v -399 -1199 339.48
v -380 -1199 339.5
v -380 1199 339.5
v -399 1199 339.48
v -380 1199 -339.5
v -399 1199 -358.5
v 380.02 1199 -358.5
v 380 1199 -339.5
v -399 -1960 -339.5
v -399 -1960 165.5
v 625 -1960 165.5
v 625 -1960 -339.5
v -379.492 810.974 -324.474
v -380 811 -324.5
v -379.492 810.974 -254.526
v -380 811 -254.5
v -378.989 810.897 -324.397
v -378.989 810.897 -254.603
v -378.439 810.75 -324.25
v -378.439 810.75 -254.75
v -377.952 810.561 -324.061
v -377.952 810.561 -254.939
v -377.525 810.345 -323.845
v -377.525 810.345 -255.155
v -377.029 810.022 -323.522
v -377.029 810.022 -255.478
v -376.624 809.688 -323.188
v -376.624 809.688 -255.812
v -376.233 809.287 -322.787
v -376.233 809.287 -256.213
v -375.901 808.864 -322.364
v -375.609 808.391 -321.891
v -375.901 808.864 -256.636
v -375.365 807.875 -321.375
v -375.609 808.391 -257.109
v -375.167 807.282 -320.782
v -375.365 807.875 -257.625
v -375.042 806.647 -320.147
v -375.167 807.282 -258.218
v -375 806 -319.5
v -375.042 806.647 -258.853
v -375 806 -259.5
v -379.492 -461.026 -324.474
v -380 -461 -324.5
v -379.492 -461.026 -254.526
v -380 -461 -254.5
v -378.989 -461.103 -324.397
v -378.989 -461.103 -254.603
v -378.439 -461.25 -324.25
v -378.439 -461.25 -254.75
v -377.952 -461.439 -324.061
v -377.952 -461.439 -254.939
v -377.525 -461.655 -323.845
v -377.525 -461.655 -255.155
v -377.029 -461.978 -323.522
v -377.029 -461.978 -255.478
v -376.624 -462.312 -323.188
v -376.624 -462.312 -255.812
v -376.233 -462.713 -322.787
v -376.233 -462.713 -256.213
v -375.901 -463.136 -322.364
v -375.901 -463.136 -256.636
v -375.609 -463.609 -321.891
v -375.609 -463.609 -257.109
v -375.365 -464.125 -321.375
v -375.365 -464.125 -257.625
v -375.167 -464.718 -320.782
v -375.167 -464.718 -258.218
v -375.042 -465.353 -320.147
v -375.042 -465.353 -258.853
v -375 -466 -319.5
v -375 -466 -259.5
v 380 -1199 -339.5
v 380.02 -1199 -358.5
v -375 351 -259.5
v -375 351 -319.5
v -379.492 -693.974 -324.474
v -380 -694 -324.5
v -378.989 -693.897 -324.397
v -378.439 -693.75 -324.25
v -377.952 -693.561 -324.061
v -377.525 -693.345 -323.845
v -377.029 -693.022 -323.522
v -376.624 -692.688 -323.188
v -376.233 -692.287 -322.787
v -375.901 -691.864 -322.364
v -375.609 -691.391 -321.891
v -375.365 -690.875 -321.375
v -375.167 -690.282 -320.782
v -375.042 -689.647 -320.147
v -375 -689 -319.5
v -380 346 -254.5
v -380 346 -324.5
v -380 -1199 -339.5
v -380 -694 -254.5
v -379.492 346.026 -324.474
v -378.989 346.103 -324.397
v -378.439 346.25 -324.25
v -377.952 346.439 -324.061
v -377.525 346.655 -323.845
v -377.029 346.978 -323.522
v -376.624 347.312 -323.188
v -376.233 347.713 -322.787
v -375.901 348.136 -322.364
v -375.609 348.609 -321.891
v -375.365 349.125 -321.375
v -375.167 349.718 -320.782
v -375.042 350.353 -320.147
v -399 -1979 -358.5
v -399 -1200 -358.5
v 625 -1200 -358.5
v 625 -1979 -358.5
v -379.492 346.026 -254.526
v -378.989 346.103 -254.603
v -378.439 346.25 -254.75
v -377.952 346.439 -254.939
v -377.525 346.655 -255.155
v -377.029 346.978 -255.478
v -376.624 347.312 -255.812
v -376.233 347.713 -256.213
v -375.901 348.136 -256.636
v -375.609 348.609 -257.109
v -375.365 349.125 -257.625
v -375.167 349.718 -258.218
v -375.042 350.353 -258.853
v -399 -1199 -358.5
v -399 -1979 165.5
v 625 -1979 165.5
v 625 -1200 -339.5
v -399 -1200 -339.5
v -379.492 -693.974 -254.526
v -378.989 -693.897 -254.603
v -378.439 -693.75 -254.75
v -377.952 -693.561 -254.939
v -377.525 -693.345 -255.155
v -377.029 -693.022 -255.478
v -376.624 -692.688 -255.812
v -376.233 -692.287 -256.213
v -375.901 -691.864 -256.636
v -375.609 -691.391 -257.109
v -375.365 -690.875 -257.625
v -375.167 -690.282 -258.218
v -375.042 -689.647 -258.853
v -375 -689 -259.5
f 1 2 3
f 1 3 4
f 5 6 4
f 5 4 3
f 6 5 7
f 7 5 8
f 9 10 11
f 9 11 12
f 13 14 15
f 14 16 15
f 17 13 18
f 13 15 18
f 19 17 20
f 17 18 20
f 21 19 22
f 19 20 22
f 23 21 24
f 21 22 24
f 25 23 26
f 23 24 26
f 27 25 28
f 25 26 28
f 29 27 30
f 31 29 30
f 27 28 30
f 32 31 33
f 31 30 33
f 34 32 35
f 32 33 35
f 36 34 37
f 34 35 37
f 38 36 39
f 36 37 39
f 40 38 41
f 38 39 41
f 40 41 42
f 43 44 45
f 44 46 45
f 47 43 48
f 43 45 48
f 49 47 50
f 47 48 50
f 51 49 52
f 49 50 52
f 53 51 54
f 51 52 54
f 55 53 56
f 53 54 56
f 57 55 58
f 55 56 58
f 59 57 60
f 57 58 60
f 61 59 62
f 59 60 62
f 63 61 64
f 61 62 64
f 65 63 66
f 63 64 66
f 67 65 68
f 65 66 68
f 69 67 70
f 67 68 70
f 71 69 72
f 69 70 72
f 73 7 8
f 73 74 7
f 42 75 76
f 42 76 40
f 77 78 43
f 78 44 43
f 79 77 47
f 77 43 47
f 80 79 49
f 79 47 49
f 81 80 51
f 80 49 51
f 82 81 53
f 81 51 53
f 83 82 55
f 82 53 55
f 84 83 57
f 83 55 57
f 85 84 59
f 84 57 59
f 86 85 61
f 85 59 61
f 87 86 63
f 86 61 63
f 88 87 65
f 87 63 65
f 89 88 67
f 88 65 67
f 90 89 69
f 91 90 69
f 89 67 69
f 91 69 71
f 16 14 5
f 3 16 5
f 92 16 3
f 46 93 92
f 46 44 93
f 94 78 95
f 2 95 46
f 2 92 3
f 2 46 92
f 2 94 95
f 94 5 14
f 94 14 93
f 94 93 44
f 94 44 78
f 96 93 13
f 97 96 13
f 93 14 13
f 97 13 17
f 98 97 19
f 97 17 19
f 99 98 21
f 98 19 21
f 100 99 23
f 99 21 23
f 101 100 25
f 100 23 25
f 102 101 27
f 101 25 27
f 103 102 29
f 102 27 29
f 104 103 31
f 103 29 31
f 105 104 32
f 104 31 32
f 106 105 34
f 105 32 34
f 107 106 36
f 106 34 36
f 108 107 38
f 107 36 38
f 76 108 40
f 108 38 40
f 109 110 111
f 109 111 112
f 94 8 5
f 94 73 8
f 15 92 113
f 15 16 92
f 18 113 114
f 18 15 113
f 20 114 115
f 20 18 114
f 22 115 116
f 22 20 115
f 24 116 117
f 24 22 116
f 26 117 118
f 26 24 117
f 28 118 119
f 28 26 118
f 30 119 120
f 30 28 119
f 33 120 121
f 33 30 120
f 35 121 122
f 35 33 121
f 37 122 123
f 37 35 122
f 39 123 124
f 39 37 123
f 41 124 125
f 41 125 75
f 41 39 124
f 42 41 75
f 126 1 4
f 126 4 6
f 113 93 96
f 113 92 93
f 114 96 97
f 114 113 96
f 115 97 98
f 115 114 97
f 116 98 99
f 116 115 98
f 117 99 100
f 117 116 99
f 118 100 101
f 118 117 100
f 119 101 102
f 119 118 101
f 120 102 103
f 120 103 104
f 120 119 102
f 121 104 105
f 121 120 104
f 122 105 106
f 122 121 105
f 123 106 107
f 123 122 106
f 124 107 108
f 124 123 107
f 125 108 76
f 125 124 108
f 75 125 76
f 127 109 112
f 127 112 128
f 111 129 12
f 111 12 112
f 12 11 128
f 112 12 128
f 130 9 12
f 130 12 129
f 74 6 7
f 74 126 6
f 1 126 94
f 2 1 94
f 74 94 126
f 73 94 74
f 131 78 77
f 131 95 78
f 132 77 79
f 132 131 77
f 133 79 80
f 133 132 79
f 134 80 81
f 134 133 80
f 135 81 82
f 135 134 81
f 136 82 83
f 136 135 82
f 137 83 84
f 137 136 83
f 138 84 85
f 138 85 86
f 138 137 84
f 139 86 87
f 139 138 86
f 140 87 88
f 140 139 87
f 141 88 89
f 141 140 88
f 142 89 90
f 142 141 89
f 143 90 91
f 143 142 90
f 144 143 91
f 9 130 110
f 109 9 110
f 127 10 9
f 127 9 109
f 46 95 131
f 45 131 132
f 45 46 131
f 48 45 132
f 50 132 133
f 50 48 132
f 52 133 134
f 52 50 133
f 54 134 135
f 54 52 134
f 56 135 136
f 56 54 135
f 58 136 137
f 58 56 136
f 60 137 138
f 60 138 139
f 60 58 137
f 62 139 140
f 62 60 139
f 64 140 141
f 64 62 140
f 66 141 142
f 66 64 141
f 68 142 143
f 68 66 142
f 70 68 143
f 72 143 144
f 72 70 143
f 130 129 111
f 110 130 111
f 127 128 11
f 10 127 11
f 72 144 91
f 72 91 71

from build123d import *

# Parameters (mm, degrees)
F1_DEPTH = 1199
F2_W     = 233
F2_H     = 70
F2_W_2   = 465
F3_DEPTH = 5
F4_R     = 4.99999
F6_DEPTH = 1024


# Not quite as in the source:
# - a fillet or chamfer is up to 0.001 mm smaller than in the source, because OpenCascade refuses the exact size


with BuildPart() as f1:
    # F0 (on Front) → F1 (new body, symmetric)
    with BuildSketch(Plane.XZ):
        Polygon((380, -339.5), (-380, -339.5), (-380, 339.5), (-398.9999890327, 339.4795854083), (-398.9999890327, -358.4999890327), (380.0204145917, -358.4999890327), align=None)
    extrude(amount=F1_DEPTH, both=True)

    # F2 (on face) → F3 (join)
    with BuildSketch(Plane.YZ.offset(-380)):
        with Locations((-577.5, -289.5)):
            Rectangle(F2_W, F2_H)
        with Locations((578.5, -289.5)):
            Rectangle(F2_W_2, F2_H)
    extrude(amount=F3_DEPTH)

    # F4 (radius 5 in the source; OpenCascade refuses exactly that, so slightly less here)
    f4_edges = [f1.edges().sort_by_distance(p)[0] for p in [
        (-375, -577.5, -254.5),
        (-375, -694, -289.5),
        (-375, -577.5, -324.5),
        (-375, -461, -289.5),
        (-375, 811, -289.5),
        (-375, 578.5, -254.5),
        (-375, 346, -289.5),
        (-375, 578.5, -324.5),
    ]]
    fillet(f4_edges, radius=F4_R)


with BuildPart() as f6:
    # F5 (on face) → F6 (new body)
    with BuildSketch(Plane(origin=(-398.9999890327, 0, 0), x_dir=(0, -1, 0), z_dir=(-1, 0, 0))):
        Polygon((1979, 165.5000109673), (1960, 165.5000109673), (1960, -339.4999890327), (1200, -339.4999890327), (1200, -358.4999890327), (1979, -358.4999890327), align=None)
    extrude(amount=-F6_DEPTH)


solid = Compound([f1.part, f6.part])
